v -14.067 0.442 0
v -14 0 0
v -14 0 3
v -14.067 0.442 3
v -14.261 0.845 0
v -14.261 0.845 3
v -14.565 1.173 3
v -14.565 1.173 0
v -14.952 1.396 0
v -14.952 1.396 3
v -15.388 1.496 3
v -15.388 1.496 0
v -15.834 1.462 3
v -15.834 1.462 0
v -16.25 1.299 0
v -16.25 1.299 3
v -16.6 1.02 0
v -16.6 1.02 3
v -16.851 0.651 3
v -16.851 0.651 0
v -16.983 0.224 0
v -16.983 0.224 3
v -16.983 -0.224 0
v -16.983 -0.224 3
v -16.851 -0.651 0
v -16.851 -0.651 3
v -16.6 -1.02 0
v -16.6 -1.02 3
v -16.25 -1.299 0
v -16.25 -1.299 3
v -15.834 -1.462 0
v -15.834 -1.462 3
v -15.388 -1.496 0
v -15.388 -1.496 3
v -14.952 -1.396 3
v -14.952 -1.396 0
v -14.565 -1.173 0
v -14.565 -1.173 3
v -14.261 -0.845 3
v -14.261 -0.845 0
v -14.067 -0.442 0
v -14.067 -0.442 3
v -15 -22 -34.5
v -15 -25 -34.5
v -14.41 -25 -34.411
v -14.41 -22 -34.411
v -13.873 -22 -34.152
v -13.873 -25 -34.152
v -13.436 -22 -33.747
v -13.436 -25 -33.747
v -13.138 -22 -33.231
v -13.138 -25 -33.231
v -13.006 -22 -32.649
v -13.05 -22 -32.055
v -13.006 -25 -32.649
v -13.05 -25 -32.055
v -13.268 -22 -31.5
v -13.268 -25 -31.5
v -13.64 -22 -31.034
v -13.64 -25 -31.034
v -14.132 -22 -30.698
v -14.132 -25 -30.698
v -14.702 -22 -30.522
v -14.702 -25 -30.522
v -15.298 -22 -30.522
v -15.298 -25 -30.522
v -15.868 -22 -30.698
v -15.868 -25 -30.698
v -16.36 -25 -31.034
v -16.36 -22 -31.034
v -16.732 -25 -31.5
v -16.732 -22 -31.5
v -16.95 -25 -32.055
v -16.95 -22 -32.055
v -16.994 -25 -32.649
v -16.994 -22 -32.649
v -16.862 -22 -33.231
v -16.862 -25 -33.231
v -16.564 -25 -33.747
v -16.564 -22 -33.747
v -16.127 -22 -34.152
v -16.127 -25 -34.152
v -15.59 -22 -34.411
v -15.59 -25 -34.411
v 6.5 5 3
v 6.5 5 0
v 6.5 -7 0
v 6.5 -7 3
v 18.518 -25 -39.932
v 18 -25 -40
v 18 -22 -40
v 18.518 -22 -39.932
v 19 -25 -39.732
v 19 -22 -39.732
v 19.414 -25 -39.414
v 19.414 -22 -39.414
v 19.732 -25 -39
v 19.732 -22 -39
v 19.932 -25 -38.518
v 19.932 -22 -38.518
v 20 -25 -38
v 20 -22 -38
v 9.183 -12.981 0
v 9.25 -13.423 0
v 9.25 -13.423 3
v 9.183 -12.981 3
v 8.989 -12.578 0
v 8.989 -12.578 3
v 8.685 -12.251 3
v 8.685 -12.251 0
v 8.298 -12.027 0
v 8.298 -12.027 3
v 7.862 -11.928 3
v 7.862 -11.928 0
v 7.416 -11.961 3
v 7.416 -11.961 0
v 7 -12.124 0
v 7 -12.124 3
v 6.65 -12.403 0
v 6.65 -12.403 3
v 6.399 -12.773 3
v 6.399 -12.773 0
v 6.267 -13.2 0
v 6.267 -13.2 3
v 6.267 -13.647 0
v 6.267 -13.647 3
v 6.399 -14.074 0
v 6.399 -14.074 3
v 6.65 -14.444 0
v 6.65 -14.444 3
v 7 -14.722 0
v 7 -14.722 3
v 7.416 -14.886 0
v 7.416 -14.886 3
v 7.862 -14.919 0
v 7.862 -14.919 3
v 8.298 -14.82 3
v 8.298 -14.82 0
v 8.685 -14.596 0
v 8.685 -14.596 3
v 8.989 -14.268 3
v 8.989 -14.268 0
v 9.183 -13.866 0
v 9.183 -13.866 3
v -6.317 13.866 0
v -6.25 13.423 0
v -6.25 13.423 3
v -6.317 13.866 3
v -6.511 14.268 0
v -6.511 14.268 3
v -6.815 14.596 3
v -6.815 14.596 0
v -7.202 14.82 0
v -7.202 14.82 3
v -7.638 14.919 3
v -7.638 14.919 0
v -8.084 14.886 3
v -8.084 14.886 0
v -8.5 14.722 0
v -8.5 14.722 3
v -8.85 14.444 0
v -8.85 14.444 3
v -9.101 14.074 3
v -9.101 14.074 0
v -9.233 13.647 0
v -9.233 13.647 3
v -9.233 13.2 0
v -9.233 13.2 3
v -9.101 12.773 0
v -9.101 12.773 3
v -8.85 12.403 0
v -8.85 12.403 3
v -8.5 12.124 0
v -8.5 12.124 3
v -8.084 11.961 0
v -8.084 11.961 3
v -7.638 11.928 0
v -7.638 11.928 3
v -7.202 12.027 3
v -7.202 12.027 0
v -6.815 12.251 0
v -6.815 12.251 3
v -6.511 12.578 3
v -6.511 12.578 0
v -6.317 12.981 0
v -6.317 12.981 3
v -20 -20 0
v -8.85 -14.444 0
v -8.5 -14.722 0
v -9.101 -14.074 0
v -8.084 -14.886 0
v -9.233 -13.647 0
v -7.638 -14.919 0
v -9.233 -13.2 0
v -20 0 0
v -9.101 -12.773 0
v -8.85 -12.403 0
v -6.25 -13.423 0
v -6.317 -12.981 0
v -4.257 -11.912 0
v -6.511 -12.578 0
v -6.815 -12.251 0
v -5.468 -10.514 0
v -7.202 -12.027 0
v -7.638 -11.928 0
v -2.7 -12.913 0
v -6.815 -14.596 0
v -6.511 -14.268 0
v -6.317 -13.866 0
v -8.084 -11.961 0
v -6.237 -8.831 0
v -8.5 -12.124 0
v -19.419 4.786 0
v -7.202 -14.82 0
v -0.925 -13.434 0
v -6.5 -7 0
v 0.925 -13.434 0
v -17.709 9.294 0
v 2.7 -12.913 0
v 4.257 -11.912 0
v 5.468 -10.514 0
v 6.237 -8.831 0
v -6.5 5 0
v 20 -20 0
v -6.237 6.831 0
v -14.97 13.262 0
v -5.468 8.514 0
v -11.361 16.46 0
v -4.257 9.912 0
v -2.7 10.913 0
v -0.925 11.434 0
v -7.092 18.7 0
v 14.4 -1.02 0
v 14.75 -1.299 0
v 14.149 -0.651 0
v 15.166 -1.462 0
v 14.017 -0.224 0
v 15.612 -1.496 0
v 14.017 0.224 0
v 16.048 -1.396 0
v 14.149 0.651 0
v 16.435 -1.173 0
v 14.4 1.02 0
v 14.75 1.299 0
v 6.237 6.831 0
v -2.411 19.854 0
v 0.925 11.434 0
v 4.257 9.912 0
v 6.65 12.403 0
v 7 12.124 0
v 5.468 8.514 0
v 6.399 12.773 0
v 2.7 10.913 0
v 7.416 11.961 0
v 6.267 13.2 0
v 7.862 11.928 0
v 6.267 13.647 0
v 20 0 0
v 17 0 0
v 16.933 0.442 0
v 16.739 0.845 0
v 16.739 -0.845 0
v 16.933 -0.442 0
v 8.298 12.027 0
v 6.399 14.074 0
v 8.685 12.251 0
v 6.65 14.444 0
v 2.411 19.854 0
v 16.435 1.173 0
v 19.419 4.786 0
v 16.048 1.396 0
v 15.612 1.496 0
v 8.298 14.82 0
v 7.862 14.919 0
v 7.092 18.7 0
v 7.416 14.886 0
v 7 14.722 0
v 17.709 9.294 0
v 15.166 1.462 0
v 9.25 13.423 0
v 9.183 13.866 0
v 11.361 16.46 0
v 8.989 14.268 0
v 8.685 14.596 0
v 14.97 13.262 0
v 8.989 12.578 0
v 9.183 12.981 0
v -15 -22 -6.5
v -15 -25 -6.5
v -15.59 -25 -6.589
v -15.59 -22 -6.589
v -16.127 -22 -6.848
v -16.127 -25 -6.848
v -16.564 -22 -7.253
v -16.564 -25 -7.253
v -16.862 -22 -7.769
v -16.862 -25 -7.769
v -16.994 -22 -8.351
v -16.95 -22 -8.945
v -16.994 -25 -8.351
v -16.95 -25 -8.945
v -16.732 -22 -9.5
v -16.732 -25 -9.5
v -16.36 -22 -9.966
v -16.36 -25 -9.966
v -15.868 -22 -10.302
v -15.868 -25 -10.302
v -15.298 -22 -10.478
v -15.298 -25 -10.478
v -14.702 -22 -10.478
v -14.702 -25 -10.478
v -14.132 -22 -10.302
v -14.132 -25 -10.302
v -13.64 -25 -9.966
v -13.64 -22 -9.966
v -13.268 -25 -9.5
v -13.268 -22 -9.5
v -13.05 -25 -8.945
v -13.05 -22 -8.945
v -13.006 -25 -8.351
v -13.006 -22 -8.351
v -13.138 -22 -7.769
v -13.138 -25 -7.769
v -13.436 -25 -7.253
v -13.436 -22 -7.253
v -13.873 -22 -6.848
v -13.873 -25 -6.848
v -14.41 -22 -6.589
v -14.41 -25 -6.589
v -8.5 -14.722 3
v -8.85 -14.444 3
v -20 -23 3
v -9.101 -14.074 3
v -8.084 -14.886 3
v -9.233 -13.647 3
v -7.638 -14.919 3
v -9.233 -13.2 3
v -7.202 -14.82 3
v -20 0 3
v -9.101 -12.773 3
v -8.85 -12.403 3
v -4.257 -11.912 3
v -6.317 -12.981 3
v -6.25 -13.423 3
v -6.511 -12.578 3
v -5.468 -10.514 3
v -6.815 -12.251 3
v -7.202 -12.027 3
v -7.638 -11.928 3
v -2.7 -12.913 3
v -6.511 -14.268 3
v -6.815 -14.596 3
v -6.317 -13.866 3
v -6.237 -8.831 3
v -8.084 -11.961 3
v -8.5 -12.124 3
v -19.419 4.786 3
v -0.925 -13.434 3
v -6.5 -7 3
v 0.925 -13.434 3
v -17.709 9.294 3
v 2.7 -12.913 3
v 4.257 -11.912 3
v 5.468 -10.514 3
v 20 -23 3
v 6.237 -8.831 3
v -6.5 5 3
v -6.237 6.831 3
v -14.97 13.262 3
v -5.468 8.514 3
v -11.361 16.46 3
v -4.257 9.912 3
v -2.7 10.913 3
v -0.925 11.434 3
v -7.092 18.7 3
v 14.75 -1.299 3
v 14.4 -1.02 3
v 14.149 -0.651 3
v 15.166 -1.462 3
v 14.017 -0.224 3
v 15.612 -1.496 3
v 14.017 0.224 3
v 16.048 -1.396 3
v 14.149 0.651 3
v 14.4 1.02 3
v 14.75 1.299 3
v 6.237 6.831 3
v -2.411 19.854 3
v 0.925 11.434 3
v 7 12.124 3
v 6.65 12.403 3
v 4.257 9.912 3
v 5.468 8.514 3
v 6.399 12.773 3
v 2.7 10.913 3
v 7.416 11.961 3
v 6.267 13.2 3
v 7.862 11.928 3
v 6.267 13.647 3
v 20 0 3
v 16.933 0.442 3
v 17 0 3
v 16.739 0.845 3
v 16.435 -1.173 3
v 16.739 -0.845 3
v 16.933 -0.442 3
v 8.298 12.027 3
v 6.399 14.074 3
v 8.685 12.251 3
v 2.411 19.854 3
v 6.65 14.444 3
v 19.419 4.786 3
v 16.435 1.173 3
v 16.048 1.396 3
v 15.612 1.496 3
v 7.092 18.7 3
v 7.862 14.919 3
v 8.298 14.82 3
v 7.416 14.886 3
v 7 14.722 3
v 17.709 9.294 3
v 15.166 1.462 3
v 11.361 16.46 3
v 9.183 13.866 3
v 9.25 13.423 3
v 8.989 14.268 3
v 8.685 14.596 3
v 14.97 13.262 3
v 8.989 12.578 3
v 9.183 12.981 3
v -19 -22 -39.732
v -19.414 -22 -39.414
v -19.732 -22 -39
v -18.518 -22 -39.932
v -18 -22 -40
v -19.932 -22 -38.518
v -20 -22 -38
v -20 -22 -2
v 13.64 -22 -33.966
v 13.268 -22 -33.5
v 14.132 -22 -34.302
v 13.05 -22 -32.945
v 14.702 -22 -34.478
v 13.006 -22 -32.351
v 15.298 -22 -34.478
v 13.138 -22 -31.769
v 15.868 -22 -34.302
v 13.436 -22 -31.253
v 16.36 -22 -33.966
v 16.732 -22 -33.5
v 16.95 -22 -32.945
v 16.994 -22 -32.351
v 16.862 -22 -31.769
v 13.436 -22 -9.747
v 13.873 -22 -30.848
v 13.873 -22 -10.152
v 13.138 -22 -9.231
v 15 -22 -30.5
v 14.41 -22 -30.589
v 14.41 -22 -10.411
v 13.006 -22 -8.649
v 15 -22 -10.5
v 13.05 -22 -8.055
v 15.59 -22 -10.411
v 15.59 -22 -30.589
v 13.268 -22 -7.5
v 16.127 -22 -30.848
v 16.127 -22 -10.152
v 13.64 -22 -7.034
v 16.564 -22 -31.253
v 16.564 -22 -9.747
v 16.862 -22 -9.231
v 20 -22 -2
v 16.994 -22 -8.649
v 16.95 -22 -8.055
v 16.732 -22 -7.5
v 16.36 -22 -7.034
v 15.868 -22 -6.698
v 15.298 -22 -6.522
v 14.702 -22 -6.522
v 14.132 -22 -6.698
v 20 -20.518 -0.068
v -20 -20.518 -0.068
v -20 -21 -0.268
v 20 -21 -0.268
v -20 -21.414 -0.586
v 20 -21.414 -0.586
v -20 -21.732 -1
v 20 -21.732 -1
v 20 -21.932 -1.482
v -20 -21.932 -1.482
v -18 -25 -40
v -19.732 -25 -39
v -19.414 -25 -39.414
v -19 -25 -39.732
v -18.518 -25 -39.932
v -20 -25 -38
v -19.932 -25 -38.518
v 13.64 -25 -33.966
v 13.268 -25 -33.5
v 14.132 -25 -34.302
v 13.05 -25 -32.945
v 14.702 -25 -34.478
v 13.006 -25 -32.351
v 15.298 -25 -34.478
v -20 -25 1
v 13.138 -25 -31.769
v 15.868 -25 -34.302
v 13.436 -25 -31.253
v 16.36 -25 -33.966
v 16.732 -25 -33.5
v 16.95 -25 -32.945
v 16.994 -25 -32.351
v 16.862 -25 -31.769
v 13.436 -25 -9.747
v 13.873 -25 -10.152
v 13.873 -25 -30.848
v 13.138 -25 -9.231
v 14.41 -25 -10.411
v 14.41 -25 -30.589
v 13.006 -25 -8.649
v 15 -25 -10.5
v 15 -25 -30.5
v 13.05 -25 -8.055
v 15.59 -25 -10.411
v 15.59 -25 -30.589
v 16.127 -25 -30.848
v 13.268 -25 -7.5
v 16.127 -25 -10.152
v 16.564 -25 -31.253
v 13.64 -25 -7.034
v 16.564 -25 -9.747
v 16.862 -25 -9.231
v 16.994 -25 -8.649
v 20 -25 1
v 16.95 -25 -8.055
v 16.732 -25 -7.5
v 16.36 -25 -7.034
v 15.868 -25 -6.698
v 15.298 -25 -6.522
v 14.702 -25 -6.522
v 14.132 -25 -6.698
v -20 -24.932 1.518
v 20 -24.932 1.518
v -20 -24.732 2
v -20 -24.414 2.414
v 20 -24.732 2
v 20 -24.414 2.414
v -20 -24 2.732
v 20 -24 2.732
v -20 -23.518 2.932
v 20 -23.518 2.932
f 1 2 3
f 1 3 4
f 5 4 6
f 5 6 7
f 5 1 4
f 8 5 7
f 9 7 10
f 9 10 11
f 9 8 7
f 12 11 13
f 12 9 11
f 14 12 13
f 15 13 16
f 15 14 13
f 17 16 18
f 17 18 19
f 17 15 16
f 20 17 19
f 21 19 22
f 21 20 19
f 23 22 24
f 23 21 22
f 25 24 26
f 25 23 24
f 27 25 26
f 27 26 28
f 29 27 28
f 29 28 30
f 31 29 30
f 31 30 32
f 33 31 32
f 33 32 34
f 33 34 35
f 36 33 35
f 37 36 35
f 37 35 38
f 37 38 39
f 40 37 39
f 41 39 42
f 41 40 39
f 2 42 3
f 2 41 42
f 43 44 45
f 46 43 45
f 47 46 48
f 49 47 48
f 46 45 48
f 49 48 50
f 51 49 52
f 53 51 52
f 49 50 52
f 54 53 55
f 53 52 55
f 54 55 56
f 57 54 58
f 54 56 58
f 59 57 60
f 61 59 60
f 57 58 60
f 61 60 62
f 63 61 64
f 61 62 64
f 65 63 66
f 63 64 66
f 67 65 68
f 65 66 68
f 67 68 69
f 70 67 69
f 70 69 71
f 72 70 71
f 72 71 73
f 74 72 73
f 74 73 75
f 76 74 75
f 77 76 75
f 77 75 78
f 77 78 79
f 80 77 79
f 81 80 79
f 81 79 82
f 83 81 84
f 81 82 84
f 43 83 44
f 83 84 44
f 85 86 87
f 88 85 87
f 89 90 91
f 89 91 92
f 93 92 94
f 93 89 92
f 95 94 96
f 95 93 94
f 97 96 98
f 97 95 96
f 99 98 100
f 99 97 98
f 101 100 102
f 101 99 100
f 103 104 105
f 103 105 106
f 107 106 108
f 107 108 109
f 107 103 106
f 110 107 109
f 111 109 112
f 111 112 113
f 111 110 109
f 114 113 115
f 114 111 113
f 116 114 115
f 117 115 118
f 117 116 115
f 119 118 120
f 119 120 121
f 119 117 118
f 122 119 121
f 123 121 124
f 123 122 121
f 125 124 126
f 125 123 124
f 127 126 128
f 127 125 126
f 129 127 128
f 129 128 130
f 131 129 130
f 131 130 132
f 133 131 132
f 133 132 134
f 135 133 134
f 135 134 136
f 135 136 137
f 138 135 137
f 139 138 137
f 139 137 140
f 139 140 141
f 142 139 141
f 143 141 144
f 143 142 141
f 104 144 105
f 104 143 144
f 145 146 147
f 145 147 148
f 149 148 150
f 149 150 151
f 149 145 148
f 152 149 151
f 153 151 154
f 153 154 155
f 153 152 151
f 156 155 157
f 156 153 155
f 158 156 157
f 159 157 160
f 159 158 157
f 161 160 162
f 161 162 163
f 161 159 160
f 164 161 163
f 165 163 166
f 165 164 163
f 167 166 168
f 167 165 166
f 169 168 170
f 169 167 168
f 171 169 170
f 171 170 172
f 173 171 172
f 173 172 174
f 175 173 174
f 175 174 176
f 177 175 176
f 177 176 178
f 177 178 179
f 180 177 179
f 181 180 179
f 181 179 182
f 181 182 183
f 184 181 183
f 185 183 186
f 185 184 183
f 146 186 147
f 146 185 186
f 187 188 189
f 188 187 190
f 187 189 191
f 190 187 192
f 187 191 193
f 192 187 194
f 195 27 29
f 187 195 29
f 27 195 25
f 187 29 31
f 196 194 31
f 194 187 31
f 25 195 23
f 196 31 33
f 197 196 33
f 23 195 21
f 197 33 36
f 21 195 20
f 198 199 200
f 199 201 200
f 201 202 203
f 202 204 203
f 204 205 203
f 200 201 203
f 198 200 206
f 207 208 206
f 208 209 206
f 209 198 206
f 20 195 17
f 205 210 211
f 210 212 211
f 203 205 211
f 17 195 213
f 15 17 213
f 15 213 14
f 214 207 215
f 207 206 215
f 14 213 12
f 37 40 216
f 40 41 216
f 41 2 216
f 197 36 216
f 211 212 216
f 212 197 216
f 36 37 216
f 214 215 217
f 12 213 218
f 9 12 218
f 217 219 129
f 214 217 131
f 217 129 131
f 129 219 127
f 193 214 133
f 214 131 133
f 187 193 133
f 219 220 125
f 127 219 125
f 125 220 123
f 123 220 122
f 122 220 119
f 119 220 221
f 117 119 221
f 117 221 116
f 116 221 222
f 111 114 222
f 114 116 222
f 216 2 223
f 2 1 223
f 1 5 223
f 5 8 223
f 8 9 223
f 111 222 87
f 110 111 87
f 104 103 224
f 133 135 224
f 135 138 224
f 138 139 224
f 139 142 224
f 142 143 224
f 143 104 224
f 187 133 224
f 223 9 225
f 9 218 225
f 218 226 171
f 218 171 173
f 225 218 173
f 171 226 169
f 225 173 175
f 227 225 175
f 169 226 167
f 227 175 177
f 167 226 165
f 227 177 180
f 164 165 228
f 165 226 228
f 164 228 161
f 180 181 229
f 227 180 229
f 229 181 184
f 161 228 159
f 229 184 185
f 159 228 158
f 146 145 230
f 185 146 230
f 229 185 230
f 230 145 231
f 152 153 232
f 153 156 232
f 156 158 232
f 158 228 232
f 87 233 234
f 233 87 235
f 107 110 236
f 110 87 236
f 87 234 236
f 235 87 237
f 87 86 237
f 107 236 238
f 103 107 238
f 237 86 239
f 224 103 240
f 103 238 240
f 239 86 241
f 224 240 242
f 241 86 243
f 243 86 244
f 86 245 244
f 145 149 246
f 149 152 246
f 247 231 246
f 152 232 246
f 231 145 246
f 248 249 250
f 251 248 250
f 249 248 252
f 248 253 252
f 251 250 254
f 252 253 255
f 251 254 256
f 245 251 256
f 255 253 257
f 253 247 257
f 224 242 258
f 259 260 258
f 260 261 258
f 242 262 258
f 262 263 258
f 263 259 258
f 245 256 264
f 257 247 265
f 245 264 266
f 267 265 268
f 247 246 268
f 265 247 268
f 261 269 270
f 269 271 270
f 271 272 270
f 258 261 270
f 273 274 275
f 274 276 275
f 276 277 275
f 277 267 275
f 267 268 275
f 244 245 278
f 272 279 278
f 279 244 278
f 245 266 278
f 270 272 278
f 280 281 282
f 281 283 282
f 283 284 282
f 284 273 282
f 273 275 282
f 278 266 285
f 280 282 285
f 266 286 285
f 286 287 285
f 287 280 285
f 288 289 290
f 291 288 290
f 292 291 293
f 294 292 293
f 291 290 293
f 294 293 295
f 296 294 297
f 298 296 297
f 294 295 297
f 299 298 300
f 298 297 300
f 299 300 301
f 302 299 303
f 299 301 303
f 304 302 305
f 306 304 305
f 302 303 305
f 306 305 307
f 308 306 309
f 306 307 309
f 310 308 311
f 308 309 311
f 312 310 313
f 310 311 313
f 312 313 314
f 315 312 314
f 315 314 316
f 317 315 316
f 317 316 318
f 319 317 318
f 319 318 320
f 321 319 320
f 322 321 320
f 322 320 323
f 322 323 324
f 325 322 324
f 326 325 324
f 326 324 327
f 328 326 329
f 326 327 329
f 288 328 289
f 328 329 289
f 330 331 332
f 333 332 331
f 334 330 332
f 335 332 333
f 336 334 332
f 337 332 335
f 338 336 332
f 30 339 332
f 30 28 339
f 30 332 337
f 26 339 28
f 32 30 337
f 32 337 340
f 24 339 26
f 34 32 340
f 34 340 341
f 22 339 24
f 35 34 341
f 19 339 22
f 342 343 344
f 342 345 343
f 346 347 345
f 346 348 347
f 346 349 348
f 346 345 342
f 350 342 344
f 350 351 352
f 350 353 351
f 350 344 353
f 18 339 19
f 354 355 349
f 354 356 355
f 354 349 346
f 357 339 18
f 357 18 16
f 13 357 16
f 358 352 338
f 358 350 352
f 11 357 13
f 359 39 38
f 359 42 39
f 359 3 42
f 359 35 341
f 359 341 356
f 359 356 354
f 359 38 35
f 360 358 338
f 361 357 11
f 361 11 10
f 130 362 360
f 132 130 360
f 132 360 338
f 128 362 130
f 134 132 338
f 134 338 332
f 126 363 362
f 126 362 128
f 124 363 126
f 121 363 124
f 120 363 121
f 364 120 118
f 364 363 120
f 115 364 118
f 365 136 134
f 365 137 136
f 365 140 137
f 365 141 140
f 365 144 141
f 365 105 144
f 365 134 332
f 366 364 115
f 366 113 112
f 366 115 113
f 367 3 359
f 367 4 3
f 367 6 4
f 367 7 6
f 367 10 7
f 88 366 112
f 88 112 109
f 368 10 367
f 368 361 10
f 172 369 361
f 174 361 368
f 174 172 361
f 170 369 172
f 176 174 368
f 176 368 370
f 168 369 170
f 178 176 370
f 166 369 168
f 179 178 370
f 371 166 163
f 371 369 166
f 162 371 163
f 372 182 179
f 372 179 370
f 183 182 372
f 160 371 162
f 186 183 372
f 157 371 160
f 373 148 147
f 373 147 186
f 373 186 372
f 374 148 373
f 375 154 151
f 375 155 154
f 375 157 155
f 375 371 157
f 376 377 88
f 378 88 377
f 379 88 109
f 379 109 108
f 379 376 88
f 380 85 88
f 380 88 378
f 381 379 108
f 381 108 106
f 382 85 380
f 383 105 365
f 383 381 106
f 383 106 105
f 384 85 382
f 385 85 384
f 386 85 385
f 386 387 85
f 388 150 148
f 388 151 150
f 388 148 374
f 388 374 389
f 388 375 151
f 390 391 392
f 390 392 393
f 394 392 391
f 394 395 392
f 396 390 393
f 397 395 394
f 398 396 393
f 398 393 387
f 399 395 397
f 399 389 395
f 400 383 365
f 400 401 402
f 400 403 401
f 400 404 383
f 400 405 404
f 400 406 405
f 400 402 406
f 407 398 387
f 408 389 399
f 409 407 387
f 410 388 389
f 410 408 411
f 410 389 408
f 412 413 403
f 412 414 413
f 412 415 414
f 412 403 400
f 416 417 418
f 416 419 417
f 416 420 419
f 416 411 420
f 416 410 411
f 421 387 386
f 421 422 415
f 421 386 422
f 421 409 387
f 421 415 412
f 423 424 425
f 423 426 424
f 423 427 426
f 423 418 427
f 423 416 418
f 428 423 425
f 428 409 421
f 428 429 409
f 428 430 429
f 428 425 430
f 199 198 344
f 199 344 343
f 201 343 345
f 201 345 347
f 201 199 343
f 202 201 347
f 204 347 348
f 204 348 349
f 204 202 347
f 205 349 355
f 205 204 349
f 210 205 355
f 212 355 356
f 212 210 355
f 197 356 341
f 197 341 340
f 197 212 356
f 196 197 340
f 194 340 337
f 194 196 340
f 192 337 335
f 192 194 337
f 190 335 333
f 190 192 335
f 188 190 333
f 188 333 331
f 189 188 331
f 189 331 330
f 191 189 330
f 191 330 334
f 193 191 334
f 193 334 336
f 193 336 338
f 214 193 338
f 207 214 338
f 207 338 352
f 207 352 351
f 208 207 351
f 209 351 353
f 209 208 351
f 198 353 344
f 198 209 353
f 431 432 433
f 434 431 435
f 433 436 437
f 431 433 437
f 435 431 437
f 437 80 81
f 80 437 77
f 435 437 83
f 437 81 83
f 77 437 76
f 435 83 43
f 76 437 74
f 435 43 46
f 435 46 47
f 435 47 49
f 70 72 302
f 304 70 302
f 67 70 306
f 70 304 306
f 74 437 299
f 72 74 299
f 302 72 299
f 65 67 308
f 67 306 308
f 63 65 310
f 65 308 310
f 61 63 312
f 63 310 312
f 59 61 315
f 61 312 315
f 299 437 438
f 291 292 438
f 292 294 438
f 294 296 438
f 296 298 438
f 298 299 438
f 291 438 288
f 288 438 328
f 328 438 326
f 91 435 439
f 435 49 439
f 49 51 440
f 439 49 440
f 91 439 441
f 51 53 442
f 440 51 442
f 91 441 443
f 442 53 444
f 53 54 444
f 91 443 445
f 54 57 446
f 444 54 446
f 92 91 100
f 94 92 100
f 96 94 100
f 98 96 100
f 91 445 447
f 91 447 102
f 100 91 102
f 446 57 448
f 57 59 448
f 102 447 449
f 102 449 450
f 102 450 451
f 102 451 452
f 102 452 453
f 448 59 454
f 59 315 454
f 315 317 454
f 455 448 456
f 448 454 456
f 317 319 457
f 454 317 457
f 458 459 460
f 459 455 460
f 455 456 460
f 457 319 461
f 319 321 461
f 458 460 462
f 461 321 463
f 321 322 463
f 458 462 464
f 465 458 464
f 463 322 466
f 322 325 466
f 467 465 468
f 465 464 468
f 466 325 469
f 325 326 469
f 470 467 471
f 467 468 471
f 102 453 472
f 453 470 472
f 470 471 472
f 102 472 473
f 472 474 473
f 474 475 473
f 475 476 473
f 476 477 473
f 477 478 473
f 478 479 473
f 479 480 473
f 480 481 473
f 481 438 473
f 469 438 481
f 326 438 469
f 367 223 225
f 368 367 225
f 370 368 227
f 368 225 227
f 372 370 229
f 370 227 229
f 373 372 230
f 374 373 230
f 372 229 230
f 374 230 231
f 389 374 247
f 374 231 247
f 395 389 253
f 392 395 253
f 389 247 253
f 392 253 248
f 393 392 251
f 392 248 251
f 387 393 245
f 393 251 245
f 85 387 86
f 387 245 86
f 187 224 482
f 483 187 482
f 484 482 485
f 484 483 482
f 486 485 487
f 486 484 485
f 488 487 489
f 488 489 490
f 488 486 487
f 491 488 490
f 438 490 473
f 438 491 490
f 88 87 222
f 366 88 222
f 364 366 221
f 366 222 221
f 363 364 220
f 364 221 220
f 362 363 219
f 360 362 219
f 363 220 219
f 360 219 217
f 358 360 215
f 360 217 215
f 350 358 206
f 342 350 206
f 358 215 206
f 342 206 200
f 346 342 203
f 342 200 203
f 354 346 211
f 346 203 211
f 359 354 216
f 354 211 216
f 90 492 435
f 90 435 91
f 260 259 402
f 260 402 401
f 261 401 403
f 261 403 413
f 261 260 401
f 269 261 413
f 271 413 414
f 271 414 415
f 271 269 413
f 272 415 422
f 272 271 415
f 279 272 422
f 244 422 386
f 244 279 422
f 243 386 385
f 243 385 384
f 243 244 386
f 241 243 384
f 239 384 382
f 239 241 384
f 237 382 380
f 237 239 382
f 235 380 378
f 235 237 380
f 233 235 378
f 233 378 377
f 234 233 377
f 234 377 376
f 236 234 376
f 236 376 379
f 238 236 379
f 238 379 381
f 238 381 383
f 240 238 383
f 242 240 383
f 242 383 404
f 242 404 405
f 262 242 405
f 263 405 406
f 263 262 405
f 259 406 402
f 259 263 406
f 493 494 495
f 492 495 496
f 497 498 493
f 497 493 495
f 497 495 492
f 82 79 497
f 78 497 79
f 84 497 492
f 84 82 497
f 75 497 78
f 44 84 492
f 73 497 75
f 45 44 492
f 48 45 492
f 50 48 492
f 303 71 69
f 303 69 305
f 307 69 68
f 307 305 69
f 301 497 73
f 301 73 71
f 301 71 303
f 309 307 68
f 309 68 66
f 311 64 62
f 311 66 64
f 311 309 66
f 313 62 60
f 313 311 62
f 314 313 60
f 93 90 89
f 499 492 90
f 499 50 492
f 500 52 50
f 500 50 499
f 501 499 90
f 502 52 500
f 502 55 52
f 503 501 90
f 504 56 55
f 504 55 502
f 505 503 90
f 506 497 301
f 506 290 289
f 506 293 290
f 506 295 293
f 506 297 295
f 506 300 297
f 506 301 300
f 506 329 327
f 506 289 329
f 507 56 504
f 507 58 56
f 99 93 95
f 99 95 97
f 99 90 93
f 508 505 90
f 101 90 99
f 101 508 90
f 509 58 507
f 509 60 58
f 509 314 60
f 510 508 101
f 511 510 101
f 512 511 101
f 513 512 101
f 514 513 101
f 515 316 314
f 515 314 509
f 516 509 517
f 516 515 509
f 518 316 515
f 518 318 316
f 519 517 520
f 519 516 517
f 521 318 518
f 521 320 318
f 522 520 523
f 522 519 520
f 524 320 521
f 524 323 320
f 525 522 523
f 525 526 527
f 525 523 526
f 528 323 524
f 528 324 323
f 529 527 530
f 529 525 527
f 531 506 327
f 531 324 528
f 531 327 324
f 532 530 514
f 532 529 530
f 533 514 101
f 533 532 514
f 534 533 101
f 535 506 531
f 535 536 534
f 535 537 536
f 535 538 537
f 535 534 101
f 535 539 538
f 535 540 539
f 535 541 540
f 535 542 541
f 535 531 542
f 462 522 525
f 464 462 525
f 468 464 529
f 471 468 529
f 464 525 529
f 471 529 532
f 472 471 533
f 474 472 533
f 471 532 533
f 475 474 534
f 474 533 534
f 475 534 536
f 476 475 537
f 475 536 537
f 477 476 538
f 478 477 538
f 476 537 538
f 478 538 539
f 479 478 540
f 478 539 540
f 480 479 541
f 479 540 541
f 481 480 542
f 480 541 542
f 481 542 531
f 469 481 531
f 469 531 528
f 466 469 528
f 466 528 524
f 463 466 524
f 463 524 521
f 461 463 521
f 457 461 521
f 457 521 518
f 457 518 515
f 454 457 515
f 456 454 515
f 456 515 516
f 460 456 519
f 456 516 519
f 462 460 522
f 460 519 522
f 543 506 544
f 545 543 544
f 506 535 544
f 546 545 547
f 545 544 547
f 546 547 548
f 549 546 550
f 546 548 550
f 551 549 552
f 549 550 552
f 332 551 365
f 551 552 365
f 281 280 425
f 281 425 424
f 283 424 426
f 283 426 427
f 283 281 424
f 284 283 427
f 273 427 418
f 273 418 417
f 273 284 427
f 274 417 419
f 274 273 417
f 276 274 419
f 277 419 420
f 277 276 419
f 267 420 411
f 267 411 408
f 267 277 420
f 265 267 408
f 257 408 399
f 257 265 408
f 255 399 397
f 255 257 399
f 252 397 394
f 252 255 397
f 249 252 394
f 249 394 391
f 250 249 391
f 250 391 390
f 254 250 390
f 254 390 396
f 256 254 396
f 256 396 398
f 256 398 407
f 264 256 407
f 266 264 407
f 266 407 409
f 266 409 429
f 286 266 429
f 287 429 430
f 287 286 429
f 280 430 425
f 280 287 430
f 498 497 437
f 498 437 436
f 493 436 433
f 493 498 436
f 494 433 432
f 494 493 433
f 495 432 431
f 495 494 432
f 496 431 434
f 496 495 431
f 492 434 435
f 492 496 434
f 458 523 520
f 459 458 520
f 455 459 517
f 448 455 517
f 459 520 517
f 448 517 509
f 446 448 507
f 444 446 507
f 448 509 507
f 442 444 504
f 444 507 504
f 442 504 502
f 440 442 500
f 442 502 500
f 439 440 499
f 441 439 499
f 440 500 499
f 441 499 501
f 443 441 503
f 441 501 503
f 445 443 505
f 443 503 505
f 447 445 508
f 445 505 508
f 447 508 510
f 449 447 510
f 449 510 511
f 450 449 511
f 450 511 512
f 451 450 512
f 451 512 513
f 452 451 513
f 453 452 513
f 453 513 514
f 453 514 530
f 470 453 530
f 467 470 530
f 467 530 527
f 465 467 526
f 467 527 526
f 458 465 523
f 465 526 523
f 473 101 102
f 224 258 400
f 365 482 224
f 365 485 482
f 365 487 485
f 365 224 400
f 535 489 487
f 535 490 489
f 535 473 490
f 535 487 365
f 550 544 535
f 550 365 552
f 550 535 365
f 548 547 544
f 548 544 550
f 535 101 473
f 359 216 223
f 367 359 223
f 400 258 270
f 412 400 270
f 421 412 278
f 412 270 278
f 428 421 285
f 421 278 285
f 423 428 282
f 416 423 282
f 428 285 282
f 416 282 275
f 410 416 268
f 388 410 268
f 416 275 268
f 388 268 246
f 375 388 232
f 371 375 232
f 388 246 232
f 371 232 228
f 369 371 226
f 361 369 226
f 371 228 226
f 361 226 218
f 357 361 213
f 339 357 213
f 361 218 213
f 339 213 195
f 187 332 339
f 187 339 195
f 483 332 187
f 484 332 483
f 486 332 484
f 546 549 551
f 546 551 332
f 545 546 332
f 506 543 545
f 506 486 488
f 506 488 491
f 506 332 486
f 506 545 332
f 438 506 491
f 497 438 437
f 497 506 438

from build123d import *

# Parameters (mm, degrees)
SKETCH_1_R      = 1.5
EXTRUDE_1_DEPTH = 3
SKETCH_2_R      = 2
EXTRUDE_2_DEPTH = 3
FILLET_1_R      = 2


with BuildPart() as part:
    # 草图1 → 凸台-拉伸1 (new body)
    with BuildSketch(Plane.XY):
        with BuildLine():
            Line((-20, 0), (-20, -25))
            Line((-20, -25), (20, -25))
            Line((20, -25), (20, 0))
            ThreePointArc((20, 0), (0, 20), (-20, 0))
        make_face()
        with Locations((7.75, 13.423393759)):
            Circle(SKETCH_1_R, mode=Mode.SUBTRACT)
        with Locations((15.5, 0)):
            Circle(SKETCH_1_R, mode=Mode.SUBTRACT)
        with Locations((7.75, -13.423393759)):
            Circle(SKETCH_1_R, mode=Mode.SUBTRACT)
        with Locations((-7.75, -13.423393759)):
            Circle(SKETCH_1_R, mode=Mode.SUBTRACT)
        with Locations((-15.5, 0)):
            Circle(SKETCH_1_R, mode=Mode.SUBTRACT)
        with Locations((-7.75, 13.423393759)):
            Circle(SKETCH_1_R, mode=Mode.SUBTRACT)
        with BuildLine():
            Line((6.5, 5), (6.5, -7))
            ThreePointArc((6.5, -7), (0, -13.5), (-6.5, -7))
            Line((-6.5, -7), (-6.5, 5))
            ThreePointArc((-6.5, 5), (0, 11.5), (6.5, 5))
        make_face(mode=Mode.SUBTRACT)
    extrude(amount=EXTRUDE_1_DEPTH)

    # 草图2 → 凸台-拉伸2 (add)
    with BuildSketch(Plane.XZ.offset(25)):
        with BuildLine():
            Line((20, 0), (-20, 0))
            Line((-20, 0), (-20, -38))
            ThreePointArc((-20, -38), (-19.414213562, -39.414213562), (-18, -40))
            Line((-18, -40), (18, -40))
            ThreePointArc((18, -40), (19.414213562, -39.414213562), (20, -38))
            Line((20, -38), (20, 0))
        make_face()
        with Locations(Location((-15, -32.5, 0), (0, 0, 270))):
            Circle(SKETCH_2_R, mode=Mode.SUBTRACT)
        with Locations(Location((-15, -8.5, 0), (0, 0, 90))):
            Circle(SKETCH_2_R, mode=Mode.SUBTRACT)
        with Locations(Location((15, -32.5, 0), (0, 0, 90))):
            Circle(SKETCH_2_R, mode=Mode.SUBTRACT)
        with Locations(Location((15, -8.5, 0), (0, 0, 270))):
            Circle(SKETCH_2_R, mode=Mode.SUBTRACT)
    extrude(amount=-EXTRUDE_2_DEPTH)

    # 圆角1
    fillet_1_edges = [part.edges().sort_by_distance(p)[0] for p in [
        (0, -25, 3),
        (0, -22, 0),
    ]]
    fillet(fillet_1_edges, radius=FILLET_1_R)


solid = part.part
